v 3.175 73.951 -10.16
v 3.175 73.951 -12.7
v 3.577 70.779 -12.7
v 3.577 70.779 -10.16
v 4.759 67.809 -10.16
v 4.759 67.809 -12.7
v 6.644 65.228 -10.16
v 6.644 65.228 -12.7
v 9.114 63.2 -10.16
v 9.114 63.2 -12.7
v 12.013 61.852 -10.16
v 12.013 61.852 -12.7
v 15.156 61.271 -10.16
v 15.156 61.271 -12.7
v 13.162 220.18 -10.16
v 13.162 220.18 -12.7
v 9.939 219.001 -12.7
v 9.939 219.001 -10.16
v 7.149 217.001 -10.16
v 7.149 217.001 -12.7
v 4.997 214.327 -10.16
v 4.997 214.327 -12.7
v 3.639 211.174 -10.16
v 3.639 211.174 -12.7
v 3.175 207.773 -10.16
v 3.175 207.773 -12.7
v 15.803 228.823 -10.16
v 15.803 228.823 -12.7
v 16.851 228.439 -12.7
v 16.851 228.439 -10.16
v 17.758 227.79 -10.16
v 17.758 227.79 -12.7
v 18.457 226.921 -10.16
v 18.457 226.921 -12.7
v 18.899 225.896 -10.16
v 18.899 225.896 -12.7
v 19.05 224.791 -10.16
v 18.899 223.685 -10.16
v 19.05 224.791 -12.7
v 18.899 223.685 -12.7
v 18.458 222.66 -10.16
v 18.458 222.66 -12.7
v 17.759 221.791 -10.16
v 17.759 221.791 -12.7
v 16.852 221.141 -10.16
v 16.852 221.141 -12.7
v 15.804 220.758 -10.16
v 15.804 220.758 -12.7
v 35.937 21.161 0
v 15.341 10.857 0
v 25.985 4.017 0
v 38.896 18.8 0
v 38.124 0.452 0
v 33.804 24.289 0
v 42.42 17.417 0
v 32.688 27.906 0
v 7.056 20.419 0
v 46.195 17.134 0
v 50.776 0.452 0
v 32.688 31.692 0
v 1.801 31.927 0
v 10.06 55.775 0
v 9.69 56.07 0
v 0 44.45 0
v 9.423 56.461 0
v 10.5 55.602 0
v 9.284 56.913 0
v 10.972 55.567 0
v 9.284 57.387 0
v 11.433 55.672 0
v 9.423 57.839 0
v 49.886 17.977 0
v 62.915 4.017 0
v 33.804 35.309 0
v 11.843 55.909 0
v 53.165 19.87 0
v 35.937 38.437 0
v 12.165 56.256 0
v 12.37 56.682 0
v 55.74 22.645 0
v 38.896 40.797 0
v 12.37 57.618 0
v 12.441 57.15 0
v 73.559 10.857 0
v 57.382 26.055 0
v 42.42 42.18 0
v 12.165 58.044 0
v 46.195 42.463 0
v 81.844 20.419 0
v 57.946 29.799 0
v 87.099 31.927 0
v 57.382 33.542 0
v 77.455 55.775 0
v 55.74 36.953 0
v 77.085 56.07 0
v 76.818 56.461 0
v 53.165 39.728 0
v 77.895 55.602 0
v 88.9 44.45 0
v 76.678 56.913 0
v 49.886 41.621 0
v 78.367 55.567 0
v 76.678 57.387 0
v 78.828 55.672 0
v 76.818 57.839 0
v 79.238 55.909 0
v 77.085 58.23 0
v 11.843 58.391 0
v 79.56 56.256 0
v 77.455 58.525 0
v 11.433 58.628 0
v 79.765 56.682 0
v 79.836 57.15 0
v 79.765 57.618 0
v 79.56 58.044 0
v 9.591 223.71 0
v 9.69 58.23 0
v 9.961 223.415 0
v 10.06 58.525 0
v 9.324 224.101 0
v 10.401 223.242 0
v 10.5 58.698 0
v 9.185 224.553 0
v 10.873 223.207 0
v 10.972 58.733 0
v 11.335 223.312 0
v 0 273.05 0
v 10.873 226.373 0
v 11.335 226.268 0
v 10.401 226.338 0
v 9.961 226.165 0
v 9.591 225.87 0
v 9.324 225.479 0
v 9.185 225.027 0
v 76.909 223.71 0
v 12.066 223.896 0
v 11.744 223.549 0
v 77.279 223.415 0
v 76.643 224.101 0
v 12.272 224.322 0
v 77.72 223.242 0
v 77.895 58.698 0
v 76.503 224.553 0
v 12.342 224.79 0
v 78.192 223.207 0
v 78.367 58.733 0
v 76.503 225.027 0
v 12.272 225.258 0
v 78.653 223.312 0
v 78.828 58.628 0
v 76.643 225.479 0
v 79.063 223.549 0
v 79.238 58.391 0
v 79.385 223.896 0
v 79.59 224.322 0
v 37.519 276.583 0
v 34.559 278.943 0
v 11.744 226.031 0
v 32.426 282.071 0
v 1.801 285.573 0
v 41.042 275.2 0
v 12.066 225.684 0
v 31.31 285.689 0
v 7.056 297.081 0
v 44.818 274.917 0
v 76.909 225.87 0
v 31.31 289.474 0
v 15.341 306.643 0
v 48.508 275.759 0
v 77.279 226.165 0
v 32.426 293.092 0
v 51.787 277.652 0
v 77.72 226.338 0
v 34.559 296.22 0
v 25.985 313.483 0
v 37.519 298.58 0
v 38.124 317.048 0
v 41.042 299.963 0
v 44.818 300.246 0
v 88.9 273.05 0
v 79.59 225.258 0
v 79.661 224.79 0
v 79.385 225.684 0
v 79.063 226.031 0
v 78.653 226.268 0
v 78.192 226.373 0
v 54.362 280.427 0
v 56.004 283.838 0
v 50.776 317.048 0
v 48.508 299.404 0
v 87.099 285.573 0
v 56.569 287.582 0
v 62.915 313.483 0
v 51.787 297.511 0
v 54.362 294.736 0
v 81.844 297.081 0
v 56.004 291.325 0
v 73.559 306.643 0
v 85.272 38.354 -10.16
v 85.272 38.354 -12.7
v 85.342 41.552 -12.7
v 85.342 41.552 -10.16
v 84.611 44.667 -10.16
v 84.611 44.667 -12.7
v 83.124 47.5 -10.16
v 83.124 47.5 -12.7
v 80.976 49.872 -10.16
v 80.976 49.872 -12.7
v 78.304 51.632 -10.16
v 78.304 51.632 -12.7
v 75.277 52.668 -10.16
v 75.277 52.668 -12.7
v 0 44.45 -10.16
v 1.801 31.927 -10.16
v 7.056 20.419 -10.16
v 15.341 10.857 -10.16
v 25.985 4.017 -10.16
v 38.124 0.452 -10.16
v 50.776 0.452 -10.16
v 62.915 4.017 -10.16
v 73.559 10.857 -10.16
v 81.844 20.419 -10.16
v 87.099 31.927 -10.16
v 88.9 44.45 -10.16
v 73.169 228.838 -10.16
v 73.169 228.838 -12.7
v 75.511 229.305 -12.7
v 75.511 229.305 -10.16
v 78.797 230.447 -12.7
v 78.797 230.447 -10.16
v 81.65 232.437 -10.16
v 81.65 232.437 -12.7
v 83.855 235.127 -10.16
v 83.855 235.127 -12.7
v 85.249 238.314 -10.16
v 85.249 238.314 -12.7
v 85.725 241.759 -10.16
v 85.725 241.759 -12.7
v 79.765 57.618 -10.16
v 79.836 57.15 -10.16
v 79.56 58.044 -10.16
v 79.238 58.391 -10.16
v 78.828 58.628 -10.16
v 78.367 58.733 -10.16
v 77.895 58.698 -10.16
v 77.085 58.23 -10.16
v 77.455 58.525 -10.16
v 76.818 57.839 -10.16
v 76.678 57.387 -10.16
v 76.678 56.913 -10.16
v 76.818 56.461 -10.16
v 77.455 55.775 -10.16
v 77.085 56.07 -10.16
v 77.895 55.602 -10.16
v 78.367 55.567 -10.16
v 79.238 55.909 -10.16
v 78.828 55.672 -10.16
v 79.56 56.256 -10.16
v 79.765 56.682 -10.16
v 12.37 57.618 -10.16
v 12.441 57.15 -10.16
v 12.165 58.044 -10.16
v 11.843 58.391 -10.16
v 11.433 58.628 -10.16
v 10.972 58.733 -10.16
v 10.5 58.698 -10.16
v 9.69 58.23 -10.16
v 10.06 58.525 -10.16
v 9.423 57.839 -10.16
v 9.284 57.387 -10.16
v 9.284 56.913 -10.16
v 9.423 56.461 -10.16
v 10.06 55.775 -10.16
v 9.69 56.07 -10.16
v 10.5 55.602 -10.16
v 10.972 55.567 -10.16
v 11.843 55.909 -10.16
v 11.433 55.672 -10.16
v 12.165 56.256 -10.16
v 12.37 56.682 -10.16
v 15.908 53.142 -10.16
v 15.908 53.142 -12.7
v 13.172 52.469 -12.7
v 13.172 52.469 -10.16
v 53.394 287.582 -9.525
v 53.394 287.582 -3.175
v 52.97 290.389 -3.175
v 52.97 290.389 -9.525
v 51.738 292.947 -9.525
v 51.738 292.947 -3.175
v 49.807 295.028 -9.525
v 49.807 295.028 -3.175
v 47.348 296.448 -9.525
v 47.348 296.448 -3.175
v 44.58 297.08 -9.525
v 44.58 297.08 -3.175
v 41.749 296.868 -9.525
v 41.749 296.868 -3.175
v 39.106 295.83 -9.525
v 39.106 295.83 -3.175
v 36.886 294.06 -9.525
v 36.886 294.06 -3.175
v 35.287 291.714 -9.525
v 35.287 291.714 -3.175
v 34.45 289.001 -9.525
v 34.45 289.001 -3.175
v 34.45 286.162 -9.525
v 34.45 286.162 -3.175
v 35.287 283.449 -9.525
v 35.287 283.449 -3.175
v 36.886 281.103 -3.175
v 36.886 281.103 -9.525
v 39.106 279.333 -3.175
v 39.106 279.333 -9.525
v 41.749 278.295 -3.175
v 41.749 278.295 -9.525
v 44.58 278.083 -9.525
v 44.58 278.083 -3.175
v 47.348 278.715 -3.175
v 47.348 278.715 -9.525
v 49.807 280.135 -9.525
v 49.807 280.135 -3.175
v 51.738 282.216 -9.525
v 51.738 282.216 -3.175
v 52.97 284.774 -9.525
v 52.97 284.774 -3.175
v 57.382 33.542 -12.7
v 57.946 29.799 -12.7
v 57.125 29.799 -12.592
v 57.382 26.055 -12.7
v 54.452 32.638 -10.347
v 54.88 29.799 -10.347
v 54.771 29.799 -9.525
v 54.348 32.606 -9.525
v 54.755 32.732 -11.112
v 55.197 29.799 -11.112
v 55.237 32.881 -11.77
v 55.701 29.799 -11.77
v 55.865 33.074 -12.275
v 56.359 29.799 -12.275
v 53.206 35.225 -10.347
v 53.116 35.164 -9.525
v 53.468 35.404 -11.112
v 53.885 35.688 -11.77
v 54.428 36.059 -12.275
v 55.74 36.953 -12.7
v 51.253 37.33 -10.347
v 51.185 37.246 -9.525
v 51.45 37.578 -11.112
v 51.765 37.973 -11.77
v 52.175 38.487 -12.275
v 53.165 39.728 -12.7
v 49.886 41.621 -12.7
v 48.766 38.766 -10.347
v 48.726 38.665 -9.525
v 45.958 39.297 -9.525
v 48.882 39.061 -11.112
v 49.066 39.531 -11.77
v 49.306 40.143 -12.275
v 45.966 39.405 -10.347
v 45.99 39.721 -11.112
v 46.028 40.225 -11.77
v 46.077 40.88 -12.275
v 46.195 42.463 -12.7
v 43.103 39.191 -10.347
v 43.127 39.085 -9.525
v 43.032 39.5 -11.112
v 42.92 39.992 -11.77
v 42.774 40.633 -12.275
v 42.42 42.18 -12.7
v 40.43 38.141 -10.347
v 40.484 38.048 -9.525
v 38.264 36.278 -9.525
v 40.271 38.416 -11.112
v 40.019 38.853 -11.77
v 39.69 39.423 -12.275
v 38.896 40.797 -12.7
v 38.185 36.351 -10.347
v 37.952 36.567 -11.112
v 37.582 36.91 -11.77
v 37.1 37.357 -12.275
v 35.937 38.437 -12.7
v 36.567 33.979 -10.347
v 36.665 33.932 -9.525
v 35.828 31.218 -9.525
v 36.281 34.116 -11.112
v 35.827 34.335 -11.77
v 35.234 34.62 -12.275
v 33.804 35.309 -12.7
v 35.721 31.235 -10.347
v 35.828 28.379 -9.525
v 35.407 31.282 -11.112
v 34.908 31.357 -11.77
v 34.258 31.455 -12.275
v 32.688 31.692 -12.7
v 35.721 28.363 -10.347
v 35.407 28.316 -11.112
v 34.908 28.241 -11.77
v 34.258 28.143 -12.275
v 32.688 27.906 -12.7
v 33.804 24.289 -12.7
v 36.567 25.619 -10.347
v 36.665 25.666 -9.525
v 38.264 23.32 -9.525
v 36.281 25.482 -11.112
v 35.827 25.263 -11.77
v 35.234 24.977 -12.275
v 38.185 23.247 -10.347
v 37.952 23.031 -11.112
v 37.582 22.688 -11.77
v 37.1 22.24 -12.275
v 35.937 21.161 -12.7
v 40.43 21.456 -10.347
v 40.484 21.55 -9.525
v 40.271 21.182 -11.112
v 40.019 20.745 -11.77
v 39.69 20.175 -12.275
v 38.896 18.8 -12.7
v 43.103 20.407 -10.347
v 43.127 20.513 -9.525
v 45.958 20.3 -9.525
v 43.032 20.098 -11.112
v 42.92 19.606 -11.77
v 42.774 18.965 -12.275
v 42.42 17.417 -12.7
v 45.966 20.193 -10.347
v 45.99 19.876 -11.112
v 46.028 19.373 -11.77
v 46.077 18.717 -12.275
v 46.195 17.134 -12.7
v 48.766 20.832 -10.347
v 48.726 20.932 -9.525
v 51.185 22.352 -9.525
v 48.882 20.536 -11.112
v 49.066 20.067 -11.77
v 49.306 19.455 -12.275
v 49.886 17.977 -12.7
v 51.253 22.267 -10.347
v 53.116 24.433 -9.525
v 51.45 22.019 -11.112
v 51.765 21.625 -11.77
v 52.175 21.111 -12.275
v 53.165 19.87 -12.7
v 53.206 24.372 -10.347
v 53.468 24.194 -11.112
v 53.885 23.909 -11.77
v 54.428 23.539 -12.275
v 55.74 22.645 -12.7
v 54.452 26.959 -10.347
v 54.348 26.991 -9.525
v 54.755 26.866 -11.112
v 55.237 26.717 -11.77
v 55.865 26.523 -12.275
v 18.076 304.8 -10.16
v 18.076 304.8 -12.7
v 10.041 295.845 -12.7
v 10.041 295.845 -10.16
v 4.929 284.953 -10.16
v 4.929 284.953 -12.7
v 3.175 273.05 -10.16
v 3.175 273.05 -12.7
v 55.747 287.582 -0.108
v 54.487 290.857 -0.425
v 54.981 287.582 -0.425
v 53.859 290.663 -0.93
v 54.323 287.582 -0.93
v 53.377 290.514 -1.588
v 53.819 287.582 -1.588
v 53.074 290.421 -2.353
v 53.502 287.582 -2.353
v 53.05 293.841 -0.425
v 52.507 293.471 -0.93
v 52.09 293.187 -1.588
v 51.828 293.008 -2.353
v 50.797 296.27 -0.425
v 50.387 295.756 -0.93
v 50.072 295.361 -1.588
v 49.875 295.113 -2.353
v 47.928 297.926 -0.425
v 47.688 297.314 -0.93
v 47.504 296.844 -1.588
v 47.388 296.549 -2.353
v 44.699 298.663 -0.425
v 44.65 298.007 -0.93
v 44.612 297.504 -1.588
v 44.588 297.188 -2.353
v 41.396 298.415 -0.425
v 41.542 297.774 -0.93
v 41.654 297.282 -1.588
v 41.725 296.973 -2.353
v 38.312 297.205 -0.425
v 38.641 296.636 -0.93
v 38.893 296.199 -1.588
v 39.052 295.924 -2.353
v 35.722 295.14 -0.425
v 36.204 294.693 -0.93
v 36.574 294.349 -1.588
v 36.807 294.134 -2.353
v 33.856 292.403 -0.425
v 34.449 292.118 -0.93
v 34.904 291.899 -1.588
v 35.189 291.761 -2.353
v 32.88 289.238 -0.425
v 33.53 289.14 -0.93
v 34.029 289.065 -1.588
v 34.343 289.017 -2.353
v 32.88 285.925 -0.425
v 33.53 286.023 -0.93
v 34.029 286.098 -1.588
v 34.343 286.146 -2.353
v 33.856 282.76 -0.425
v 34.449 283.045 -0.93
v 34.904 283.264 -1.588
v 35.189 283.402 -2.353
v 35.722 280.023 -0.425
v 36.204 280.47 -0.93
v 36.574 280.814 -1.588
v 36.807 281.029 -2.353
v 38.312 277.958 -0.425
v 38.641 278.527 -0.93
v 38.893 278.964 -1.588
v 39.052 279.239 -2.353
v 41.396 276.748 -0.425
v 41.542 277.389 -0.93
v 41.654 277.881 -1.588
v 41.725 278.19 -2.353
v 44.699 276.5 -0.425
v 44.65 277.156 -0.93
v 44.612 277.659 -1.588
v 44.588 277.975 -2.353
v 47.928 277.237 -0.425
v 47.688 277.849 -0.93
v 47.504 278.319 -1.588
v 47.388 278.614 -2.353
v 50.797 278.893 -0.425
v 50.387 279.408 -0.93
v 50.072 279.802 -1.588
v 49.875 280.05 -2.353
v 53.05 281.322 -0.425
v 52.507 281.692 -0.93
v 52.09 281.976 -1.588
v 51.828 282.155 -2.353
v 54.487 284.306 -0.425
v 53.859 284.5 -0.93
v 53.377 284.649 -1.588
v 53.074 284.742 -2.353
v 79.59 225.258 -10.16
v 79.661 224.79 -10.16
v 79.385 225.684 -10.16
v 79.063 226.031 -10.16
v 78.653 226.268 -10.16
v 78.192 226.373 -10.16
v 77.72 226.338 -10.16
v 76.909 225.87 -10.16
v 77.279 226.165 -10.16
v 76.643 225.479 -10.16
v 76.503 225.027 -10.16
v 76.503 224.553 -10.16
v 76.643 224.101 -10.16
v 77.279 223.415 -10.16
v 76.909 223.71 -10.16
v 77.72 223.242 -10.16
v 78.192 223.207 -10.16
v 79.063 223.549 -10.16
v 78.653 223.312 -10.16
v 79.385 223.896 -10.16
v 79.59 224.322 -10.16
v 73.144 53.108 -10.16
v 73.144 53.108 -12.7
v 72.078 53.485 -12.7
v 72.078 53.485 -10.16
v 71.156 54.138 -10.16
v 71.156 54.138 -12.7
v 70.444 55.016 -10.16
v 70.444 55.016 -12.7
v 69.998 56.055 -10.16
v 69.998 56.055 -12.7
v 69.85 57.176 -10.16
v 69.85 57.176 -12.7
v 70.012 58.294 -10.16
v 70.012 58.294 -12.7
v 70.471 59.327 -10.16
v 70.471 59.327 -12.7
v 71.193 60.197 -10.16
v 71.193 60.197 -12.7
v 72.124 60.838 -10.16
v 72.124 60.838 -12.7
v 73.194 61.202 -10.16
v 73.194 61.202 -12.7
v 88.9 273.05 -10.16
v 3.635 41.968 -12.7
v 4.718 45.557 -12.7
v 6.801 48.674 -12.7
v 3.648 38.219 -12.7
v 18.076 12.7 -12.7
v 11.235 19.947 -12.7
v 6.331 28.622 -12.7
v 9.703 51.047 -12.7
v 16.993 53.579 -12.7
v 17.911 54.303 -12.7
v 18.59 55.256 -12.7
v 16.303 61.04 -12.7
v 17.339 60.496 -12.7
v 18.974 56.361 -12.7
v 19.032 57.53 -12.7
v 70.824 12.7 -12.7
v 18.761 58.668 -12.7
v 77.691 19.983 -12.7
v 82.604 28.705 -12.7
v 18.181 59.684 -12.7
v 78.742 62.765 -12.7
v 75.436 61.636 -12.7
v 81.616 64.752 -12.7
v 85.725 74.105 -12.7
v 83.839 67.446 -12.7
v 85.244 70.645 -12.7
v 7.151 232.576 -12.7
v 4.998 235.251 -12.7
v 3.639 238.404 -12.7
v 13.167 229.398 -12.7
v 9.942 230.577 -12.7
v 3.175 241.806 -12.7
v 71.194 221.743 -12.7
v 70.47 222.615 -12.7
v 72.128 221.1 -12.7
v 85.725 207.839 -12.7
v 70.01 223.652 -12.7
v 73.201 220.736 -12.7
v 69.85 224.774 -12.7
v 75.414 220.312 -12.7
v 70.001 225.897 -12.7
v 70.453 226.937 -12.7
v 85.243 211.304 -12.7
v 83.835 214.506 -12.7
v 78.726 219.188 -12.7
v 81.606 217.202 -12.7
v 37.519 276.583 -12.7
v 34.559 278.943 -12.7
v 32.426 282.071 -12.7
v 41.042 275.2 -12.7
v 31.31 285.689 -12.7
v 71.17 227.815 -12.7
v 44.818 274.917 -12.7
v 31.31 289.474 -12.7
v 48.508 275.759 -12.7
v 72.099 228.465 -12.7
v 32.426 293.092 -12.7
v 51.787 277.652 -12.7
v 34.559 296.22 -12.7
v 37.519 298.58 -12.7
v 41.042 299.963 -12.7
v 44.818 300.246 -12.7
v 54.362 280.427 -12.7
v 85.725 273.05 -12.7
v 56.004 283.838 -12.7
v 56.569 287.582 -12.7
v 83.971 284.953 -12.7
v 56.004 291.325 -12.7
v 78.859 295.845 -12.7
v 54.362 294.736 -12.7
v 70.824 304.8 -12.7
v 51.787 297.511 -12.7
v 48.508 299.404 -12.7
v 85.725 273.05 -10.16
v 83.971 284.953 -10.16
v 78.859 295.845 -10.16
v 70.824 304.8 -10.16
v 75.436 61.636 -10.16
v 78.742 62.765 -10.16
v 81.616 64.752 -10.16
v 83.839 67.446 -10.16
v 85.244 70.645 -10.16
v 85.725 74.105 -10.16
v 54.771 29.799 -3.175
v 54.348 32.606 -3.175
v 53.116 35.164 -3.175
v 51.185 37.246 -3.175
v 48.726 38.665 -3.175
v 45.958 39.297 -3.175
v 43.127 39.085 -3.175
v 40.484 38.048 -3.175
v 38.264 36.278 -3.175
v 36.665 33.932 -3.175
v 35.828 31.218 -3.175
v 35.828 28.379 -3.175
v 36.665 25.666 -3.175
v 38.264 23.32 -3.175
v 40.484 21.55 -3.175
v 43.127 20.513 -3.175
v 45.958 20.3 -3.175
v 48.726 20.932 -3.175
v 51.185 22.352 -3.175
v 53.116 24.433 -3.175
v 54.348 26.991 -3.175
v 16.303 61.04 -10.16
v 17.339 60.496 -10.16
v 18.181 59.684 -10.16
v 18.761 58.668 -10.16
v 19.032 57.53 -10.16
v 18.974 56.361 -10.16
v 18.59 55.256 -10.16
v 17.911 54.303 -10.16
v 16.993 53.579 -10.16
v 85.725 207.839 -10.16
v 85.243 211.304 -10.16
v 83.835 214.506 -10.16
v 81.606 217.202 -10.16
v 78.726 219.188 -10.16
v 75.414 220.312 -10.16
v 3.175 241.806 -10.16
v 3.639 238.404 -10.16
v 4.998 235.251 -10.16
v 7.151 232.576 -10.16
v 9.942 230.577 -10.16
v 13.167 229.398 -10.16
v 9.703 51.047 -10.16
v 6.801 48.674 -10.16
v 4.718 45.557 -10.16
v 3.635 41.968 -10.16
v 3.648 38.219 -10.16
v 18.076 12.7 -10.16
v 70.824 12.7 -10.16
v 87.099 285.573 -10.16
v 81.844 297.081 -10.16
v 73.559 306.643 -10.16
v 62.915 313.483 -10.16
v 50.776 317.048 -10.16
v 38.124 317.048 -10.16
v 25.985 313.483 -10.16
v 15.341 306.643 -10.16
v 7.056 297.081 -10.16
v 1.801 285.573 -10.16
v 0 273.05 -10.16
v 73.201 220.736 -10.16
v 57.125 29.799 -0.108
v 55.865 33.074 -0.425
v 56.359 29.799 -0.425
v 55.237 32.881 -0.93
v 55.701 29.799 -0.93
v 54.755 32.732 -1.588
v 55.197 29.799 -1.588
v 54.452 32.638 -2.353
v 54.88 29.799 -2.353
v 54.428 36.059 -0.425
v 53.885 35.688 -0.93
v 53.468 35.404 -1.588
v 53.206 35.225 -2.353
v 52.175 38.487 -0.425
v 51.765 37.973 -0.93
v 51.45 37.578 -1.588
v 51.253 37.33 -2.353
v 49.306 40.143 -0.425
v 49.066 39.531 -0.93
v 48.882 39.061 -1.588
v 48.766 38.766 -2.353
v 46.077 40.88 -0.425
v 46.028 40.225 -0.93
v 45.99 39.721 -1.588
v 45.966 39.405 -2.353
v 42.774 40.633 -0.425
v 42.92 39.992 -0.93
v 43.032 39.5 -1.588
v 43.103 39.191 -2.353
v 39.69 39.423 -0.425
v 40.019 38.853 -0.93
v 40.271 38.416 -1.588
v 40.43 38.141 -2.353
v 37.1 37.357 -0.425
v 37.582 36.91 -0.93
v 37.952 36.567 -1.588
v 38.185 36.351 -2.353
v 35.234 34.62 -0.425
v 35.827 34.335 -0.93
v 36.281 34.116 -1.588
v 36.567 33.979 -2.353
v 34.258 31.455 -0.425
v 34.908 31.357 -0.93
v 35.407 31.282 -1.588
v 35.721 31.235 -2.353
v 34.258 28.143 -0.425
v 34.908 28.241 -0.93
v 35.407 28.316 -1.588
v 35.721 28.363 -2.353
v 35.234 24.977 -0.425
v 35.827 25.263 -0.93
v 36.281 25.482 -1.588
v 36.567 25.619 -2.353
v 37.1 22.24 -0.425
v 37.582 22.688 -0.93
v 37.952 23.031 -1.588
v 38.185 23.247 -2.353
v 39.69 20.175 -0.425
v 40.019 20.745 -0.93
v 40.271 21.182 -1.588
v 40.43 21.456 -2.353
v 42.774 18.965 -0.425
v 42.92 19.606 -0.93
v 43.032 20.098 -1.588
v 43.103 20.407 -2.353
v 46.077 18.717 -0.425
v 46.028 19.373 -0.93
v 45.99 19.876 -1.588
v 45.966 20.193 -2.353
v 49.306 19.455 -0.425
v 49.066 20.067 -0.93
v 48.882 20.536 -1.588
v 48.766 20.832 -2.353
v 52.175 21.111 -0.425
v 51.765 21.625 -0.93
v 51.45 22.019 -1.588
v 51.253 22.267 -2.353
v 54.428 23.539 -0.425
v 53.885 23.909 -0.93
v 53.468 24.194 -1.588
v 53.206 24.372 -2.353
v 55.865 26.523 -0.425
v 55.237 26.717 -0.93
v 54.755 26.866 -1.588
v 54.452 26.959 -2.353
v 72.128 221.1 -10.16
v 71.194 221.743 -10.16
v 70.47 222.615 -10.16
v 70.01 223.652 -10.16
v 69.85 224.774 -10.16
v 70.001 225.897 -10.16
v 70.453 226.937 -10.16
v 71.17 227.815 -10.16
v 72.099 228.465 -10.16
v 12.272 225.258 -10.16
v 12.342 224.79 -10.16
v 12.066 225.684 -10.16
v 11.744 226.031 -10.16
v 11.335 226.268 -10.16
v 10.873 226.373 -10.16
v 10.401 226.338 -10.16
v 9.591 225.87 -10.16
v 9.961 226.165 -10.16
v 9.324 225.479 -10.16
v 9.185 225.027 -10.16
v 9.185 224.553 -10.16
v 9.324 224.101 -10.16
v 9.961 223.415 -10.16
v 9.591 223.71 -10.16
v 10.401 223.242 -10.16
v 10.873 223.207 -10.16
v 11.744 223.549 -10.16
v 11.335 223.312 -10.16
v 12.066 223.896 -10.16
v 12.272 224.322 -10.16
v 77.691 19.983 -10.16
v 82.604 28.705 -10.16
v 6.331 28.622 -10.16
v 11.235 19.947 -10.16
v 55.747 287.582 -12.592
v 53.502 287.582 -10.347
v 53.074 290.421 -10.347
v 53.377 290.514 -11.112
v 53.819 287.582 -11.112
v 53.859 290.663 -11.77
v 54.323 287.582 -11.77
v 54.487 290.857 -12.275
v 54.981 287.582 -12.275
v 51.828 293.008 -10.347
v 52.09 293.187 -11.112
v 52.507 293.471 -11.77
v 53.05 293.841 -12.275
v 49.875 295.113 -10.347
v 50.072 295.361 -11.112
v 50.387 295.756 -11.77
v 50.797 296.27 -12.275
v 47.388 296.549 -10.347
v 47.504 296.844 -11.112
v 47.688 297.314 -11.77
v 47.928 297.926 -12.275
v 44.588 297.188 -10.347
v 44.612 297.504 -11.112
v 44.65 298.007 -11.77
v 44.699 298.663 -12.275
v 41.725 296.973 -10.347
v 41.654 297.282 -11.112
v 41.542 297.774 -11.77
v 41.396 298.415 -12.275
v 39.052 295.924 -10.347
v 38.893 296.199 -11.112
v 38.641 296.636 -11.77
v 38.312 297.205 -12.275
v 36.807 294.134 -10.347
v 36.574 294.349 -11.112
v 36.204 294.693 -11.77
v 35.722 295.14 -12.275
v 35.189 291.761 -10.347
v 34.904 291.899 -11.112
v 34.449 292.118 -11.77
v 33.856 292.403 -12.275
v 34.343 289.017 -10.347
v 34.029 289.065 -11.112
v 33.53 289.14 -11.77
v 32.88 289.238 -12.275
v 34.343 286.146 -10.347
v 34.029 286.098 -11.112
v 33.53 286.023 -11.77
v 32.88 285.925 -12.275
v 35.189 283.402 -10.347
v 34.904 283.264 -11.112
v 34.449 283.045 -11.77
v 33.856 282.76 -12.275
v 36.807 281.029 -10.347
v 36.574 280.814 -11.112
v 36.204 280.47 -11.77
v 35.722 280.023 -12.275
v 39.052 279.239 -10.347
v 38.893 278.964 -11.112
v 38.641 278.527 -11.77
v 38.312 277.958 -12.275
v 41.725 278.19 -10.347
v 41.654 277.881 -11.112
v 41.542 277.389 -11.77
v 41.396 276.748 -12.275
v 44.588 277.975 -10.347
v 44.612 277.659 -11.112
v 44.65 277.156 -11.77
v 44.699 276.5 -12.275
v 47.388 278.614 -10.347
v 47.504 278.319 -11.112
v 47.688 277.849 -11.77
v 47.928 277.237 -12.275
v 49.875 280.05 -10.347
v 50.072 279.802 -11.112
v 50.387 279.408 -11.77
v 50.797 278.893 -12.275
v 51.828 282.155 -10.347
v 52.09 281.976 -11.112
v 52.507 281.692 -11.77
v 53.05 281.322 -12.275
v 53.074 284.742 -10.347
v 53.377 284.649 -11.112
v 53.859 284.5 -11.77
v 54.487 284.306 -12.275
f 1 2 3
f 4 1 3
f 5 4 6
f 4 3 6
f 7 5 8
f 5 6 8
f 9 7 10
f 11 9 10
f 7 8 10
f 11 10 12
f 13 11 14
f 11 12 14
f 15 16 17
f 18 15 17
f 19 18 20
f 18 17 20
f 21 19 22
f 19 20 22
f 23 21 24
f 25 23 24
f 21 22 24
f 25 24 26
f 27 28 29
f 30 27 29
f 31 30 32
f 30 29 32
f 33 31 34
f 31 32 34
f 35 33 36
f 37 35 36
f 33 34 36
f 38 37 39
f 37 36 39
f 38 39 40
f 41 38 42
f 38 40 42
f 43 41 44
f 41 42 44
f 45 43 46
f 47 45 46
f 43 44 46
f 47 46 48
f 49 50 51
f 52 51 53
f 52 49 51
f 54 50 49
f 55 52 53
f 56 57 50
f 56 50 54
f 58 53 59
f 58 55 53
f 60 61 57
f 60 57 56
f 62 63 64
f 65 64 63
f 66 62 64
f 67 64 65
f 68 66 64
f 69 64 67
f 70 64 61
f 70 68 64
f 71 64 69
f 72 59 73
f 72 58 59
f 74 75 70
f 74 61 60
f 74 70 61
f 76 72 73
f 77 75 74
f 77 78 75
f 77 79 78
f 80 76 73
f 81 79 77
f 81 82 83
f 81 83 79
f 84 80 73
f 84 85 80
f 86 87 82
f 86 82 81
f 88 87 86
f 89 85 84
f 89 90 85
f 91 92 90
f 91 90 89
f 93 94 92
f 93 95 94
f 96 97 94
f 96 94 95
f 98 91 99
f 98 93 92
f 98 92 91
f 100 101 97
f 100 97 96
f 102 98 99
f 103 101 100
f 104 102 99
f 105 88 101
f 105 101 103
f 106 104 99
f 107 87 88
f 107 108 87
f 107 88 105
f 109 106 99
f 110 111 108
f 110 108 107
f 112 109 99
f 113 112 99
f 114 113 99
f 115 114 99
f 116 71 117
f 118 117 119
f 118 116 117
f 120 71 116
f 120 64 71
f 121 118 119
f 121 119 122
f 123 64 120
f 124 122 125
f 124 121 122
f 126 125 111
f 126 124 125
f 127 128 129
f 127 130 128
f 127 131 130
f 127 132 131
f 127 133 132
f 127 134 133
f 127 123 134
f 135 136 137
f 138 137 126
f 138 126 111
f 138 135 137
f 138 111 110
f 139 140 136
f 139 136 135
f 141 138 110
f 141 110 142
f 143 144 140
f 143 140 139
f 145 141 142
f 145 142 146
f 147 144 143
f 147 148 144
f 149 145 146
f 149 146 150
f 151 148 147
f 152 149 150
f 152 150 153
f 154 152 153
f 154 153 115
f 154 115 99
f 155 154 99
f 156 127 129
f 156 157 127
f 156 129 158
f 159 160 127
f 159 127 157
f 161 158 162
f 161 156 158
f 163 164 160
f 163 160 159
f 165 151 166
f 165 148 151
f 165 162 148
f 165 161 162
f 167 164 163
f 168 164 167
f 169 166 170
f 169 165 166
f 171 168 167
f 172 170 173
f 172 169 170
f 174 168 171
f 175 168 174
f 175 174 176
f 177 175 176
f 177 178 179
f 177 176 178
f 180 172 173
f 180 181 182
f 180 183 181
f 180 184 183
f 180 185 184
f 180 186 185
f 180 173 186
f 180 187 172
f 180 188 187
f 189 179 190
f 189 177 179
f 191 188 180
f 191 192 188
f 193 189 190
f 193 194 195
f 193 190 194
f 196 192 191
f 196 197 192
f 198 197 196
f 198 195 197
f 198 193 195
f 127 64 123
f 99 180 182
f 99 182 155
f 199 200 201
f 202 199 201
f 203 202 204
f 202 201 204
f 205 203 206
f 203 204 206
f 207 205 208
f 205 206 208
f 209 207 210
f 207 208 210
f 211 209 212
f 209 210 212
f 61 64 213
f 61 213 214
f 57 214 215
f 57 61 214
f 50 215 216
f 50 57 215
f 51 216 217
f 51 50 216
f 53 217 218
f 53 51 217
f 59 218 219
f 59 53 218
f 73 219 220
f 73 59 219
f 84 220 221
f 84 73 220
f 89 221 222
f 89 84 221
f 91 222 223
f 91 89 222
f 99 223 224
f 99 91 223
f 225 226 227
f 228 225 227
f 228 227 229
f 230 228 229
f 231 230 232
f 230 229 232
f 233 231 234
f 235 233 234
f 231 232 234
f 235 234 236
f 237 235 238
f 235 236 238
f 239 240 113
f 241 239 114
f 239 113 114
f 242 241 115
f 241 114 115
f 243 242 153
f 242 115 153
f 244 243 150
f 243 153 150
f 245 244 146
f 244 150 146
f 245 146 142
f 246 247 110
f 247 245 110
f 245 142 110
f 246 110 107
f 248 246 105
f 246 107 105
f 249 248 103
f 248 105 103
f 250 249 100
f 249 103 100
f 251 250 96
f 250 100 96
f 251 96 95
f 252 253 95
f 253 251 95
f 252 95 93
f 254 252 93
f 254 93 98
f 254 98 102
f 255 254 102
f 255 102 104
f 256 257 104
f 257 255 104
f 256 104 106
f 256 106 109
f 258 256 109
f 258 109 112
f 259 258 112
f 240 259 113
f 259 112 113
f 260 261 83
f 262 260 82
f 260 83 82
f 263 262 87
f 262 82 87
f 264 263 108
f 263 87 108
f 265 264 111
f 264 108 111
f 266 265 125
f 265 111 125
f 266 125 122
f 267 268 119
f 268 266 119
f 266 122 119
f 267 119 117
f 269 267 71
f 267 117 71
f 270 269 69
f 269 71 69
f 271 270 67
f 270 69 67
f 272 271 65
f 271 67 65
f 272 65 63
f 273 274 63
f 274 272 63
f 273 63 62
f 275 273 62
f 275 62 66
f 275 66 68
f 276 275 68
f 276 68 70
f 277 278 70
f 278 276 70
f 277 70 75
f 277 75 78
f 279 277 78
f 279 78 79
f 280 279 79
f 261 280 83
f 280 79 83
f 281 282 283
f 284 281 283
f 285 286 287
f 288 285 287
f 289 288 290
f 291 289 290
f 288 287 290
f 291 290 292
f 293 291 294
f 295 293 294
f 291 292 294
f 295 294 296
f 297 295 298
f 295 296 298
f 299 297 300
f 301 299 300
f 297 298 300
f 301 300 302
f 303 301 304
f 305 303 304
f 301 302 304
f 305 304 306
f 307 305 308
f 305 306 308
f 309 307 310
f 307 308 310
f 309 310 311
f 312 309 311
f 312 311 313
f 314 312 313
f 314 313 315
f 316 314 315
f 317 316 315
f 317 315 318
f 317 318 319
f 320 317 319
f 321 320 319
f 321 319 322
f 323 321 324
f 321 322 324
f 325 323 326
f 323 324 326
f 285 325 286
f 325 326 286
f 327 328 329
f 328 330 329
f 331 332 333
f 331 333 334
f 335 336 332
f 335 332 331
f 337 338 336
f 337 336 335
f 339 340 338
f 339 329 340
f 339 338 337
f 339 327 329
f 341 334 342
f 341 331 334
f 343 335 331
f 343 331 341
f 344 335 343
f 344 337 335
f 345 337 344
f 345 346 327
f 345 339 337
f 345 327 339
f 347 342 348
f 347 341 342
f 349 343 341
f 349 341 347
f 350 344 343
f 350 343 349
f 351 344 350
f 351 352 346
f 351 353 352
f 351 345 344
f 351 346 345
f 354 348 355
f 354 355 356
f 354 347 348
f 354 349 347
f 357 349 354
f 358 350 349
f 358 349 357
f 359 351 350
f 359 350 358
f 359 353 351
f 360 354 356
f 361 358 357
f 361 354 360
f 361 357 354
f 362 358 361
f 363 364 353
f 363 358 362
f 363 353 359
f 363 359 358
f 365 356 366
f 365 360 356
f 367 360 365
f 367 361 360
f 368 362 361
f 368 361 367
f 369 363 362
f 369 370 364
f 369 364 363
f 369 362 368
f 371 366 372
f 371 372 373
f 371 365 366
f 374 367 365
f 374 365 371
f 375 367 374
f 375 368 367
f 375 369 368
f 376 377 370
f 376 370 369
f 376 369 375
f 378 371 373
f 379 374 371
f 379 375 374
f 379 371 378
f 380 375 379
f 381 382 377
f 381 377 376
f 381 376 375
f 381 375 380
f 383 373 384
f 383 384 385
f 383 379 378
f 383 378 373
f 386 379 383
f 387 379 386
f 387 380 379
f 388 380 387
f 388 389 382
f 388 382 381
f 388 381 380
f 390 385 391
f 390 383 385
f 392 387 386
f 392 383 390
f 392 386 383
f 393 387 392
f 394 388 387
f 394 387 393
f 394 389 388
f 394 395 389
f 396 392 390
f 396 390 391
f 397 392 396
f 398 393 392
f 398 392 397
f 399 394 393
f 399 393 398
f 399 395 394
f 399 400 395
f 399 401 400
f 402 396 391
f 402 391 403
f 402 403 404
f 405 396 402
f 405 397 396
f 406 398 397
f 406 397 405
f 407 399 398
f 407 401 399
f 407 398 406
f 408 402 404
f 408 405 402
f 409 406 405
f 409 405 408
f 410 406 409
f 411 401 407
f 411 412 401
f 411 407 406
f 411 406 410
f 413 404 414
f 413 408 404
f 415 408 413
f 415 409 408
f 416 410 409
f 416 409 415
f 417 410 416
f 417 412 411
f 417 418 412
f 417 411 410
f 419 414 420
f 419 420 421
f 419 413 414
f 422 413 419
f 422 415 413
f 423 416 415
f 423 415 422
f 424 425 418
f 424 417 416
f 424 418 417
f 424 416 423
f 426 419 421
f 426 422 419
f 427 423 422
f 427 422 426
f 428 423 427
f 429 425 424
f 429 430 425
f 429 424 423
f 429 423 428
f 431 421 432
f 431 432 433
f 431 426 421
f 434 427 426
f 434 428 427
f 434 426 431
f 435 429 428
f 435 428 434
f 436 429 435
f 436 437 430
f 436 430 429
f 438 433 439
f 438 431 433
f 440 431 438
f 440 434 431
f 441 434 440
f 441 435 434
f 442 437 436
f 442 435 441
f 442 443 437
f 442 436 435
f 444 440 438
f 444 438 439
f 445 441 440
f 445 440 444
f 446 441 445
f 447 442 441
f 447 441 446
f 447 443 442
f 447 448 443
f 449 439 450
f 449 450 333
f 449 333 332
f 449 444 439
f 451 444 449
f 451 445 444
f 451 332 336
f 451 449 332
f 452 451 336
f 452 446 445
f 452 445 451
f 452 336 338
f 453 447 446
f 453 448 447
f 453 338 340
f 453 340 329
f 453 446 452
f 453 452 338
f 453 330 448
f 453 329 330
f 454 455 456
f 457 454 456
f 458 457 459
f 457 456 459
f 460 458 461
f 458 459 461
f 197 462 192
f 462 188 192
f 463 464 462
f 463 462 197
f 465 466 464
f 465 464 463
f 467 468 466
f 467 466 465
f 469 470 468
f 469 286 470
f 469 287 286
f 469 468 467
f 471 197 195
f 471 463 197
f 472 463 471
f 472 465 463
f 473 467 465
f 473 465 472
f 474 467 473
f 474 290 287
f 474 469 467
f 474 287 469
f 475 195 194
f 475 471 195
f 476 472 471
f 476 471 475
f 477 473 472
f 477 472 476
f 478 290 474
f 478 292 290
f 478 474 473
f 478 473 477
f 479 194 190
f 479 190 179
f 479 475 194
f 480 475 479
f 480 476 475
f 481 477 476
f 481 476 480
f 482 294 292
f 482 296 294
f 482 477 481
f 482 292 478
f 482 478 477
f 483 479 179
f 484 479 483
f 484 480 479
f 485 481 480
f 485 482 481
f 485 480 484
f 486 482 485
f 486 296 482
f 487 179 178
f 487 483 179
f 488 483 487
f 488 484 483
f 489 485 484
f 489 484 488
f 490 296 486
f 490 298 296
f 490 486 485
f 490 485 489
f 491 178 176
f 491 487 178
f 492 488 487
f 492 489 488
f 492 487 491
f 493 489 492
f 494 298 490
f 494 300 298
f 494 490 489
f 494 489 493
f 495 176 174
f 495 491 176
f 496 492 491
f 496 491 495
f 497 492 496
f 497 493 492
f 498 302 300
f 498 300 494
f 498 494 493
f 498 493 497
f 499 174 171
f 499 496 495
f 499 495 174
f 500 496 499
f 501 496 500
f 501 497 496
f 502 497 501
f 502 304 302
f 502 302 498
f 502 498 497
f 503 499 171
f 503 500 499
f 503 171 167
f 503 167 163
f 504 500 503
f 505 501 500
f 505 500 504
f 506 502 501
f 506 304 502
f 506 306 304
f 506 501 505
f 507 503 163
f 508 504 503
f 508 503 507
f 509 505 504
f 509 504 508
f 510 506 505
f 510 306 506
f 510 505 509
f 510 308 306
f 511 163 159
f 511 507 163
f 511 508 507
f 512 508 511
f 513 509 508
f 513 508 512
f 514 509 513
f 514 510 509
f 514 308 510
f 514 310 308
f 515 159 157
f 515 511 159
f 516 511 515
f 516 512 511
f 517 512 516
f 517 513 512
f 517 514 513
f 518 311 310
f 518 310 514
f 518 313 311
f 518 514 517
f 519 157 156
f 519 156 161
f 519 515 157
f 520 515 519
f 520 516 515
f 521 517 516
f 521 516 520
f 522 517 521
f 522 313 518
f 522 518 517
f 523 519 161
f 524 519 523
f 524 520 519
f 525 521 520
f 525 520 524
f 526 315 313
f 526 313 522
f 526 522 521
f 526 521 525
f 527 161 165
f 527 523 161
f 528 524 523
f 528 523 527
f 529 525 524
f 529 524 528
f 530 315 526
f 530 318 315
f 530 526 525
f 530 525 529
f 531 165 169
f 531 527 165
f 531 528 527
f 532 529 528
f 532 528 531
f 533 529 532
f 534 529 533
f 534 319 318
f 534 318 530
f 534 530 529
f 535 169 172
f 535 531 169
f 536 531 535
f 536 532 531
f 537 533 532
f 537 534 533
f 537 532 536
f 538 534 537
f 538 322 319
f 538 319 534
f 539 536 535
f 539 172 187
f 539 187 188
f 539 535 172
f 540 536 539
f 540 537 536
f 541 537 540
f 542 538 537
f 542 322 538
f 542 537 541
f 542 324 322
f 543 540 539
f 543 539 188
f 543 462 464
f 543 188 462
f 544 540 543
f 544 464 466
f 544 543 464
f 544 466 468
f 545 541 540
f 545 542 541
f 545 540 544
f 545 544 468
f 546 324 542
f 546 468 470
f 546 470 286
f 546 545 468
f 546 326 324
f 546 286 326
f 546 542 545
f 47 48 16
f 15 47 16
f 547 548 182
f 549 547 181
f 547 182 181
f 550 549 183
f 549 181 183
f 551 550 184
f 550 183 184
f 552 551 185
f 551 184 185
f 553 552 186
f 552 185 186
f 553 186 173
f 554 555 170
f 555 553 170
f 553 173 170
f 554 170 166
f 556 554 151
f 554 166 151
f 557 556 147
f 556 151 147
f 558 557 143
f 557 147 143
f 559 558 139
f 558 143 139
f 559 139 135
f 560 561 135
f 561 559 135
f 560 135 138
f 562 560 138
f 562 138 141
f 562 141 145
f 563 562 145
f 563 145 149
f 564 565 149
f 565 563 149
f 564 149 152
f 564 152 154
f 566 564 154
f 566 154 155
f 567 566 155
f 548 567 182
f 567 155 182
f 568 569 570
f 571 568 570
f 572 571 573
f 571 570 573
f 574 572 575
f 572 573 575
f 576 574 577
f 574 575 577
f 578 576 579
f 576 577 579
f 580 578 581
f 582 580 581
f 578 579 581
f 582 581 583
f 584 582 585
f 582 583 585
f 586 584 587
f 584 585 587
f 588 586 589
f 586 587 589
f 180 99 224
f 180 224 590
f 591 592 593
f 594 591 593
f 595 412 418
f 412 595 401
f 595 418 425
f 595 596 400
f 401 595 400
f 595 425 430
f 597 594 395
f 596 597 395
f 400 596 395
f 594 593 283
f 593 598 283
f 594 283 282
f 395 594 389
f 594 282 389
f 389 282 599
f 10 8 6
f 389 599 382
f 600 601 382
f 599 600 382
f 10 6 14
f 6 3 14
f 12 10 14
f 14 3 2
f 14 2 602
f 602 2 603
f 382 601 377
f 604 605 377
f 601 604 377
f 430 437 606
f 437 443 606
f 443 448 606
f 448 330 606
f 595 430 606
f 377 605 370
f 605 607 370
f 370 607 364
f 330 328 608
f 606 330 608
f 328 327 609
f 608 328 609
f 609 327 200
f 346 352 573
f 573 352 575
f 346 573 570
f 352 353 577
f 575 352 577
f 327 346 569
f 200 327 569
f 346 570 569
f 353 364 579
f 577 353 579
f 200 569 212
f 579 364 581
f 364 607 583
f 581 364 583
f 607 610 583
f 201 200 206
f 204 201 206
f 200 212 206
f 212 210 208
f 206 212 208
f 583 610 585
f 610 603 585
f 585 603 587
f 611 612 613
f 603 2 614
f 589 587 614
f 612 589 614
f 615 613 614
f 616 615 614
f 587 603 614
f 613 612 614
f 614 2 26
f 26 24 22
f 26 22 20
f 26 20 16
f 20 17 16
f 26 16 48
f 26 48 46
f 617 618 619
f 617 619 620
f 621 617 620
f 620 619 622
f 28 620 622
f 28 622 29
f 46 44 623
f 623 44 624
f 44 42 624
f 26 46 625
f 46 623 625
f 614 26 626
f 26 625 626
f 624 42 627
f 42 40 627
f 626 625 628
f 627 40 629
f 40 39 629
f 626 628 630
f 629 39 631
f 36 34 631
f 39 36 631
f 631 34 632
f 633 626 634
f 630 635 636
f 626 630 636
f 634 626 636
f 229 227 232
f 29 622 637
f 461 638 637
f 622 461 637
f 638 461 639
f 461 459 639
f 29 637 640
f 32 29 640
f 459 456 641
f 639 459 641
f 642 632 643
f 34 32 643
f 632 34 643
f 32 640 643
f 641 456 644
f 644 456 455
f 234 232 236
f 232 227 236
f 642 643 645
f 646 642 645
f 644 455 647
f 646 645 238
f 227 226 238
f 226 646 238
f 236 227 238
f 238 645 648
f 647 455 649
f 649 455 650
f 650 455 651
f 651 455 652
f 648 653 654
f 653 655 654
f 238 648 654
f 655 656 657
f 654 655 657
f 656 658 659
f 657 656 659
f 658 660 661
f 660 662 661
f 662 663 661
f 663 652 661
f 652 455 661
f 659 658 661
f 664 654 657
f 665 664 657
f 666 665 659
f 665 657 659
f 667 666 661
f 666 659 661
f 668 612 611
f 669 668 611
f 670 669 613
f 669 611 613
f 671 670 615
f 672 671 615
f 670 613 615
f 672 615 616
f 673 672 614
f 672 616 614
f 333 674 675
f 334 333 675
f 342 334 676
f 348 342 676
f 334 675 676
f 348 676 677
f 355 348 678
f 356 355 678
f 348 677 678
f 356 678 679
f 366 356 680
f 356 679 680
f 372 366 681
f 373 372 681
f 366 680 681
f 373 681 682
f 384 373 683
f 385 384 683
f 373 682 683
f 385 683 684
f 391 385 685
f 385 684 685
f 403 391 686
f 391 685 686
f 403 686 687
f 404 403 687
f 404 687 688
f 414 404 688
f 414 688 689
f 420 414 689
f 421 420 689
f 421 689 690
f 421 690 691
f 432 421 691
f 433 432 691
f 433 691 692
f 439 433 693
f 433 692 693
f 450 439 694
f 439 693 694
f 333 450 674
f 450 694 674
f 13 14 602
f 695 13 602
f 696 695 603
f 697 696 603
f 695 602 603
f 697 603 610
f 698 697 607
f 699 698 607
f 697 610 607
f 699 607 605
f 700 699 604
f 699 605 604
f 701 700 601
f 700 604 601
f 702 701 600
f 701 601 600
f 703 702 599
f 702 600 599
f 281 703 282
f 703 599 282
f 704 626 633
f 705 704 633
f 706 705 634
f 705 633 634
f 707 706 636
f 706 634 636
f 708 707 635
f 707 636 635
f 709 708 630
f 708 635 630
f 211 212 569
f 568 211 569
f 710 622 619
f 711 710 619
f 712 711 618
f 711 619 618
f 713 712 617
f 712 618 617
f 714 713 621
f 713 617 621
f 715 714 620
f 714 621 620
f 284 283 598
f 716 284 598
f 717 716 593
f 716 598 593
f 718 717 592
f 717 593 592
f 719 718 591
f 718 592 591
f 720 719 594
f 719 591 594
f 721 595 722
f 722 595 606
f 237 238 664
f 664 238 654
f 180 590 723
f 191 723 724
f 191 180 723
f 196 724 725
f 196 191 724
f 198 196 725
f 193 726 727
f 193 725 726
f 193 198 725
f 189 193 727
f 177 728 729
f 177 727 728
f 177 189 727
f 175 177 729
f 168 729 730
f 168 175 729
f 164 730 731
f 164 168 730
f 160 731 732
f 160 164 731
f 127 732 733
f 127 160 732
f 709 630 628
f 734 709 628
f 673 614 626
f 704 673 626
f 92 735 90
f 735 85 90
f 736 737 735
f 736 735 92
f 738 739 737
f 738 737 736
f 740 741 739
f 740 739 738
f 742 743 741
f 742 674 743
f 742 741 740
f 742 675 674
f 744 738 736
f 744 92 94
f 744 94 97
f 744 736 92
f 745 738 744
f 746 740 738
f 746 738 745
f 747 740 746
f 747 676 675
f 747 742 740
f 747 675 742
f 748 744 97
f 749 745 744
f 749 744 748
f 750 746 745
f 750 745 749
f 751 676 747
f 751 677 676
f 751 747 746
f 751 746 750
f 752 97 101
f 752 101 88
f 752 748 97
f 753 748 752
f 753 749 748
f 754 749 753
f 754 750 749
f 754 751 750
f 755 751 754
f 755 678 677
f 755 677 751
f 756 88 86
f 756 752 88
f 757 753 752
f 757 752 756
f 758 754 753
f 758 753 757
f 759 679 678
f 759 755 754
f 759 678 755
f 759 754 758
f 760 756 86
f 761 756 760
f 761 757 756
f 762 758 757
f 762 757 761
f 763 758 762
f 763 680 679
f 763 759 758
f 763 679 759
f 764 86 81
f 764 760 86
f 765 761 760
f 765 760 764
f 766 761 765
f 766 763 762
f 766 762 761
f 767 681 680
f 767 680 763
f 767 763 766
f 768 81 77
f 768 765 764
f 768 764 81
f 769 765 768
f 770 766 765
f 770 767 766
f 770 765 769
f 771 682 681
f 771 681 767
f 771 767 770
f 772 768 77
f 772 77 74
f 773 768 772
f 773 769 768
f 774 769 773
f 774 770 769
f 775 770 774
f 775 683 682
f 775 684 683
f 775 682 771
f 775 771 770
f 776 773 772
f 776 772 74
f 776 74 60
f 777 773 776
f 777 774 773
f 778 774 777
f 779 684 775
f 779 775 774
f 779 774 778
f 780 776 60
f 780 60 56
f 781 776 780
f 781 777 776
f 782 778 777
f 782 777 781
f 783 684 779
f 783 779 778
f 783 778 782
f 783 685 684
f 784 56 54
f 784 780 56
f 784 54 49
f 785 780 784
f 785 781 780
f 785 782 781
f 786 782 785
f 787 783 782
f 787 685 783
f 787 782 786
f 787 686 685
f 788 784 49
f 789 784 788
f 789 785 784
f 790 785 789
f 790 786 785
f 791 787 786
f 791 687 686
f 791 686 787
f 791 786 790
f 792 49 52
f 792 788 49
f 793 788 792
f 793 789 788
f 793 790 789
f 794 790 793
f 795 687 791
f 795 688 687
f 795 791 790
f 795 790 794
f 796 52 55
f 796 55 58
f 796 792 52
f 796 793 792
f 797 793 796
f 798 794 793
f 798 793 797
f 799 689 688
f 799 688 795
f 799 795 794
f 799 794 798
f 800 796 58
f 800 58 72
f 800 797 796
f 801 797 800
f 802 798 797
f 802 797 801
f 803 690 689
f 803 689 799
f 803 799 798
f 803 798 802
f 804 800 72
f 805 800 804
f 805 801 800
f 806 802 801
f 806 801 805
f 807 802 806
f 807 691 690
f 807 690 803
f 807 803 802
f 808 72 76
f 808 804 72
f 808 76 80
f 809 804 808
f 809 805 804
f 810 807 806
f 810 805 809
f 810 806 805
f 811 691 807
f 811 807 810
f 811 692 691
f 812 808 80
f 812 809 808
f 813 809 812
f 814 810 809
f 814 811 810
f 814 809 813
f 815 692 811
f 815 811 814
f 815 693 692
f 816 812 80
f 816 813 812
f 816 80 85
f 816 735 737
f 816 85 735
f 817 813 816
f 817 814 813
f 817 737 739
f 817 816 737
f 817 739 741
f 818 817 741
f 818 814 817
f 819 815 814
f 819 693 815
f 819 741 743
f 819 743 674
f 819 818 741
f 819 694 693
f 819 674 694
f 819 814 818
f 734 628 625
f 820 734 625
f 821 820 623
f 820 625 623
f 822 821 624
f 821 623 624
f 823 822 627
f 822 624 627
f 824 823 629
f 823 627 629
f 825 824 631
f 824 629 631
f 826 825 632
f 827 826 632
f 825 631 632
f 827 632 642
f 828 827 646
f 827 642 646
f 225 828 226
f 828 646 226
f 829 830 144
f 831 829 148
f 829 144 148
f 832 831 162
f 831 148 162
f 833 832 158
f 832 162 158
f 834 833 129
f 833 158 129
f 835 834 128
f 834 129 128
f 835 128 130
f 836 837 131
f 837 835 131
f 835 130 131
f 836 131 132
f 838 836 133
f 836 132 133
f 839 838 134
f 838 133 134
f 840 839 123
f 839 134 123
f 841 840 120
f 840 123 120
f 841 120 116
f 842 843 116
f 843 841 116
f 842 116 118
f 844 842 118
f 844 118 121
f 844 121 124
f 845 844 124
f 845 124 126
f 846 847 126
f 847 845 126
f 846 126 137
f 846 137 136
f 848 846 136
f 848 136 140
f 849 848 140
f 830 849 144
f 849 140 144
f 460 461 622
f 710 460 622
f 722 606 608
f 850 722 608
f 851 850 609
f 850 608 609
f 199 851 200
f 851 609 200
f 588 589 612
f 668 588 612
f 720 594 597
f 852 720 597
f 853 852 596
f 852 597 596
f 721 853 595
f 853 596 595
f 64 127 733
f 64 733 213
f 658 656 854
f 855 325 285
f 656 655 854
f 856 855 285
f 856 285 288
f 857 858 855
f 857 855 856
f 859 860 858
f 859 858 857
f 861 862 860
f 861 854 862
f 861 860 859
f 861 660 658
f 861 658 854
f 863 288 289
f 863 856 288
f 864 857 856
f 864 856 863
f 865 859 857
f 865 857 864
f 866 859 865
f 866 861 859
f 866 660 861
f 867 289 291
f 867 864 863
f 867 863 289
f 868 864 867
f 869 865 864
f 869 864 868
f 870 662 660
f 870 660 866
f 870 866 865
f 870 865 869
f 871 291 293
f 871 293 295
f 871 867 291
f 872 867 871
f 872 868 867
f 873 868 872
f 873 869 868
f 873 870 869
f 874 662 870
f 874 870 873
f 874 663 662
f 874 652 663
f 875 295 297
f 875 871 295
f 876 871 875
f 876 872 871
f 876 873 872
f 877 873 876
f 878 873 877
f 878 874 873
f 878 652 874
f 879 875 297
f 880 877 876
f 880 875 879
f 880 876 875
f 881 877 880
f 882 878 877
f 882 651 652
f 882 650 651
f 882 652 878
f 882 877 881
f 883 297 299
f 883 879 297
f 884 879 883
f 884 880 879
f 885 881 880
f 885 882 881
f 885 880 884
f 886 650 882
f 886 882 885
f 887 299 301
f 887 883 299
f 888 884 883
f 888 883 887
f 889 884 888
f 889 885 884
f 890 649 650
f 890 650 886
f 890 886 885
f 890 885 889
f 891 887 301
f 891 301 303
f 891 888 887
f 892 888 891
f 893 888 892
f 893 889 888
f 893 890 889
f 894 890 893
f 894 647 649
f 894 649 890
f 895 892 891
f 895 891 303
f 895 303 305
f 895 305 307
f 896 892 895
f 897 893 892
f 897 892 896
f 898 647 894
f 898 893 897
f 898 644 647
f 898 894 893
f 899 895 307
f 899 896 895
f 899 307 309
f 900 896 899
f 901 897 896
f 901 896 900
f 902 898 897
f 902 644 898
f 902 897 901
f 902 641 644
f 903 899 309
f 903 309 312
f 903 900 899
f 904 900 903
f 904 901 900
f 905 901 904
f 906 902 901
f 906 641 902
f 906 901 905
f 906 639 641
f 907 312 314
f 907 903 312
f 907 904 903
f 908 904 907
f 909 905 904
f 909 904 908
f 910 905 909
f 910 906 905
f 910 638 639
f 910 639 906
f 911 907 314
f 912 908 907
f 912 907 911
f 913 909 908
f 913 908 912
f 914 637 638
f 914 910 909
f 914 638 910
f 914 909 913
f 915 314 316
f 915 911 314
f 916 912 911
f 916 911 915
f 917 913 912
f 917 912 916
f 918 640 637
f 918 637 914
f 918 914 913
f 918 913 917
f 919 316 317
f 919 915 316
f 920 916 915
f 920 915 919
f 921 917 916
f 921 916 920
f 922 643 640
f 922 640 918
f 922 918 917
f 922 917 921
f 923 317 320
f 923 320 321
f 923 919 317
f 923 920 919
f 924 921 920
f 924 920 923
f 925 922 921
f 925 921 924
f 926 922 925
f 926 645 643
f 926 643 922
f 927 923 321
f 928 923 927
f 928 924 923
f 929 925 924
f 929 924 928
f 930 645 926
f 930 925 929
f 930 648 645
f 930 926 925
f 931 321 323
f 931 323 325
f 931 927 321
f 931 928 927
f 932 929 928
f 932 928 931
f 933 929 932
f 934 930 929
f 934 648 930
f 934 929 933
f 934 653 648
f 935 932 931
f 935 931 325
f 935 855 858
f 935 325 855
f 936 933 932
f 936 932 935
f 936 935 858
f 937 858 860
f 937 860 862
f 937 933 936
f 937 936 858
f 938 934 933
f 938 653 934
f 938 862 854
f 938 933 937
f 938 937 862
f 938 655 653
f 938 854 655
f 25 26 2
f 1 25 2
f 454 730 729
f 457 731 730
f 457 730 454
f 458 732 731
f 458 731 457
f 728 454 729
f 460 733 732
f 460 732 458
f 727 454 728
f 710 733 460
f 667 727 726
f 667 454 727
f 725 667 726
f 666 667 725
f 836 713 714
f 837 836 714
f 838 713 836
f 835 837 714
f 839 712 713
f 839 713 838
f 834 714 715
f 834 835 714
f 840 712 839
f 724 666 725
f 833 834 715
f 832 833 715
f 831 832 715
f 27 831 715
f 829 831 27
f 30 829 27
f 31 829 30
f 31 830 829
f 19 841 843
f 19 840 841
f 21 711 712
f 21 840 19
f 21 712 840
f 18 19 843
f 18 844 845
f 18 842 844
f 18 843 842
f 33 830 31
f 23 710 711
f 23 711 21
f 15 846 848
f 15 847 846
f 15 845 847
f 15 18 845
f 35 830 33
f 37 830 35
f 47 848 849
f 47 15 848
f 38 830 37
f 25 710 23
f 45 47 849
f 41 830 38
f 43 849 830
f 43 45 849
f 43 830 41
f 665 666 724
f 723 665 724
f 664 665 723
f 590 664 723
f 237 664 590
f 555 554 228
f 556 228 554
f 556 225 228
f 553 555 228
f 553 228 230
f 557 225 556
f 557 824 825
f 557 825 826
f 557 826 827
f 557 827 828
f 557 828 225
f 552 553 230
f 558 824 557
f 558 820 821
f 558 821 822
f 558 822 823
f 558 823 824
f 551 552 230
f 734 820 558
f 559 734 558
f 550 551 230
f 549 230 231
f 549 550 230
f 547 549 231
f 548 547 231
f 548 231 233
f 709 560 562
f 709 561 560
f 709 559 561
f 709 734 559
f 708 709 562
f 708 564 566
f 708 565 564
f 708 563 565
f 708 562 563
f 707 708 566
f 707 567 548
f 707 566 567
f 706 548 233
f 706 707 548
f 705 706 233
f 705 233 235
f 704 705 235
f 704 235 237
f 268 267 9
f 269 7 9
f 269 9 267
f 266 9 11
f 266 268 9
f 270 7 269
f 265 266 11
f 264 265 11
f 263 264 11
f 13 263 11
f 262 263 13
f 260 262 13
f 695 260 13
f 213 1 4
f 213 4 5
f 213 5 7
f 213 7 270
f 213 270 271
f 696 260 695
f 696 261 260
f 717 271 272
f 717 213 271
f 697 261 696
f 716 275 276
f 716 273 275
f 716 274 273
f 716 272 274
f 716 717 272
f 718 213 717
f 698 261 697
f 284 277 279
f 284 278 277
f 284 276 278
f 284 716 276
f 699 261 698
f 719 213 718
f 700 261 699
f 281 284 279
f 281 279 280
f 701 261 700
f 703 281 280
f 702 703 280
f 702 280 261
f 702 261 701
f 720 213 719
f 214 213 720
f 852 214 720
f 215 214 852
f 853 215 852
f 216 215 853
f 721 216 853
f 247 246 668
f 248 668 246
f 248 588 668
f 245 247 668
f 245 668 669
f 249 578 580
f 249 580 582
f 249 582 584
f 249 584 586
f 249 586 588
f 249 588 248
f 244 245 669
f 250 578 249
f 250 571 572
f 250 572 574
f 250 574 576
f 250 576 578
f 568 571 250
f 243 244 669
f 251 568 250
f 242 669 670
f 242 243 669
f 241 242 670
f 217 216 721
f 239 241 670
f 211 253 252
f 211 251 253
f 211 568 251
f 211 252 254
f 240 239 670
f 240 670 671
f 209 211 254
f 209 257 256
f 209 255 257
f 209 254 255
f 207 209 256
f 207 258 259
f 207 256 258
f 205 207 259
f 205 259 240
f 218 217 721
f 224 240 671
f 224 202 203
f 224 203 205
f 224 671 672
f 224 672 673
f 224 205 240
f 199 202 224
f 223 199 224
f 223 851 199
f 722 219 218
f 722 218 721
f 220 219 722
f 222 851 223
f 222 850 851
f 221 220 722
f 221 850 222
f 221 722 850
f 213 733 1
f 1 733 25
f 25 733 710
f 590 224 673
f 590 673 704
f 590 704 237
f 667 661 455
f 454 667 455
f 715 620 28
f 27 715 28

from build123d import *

# Parameters (mm, degrees)
F1_R     = 1.5875
F1_R_2   = 9.525
F2_DEPTH = 12.7
F3_R     = 1.5875
F4_DEPTH = 2.54
F5_R     = 3.175


with BuildPart() as f2:
    # F1 (on Top) → F2 (new body)
    with BuildSketch(Plane.XY):
        with BuildLine():
            ThreePointArc((88.9, 273.05), (44.45, 317.5), (0, 273.05))
            Line((0, 273.05), (0, 44.45))
            ThreePointArc((0, 44.45), (44.45, 0), (88.9, 44.45))
            Line((88.9, 44.45), (88.9, 273.05))
        make_face()
        with Locations((10.853484273, 57.15)):
            Circle(F1_R, mode=Mode.SUBTRACT)
        with Locations((45.2464185655, 29.7988653183)):
            Circle(F1_R_2, mode=Mode.SUBTRACT)
        with Locations((78.2482549548, 57.15)):
            Circle(F1_R, mode=Mode.SUBTRACT)
        with Locations((10.7546523213, 224.79)):
            Circle(F1_R, mode=Mode.SUBTRACT)
        with Locations((43.8685081899, 287.5815033913)):
            Circle(F1_R_2, mode=Mode.SUBTRACT)
        with Locations((78.0730992556, 224.79)):
            Circle(F1_R, mode=Mode.SUBTRACT)
    extrude(amount=-F2_DEPTH)

    # F3 (on face) → F4 (cut)
    with BuildSketch(Plane(origin=(0, 0, -12.7), x_dir=(1, 0, 0), z_dir=(0, 0, -1))):
        with BuildLine():
            Line((0, -44.45), (0, -273.05))
            ThreePointArc((0, -273.05), (44.45, -317.5), (88.9, -273.05))
            Line((88.9, -273.05), (88.9, -44.45))
            ThreePointArc((88.9, -44.45), (44.45, 0), (0, -44.45))
        make_face()
        with Locations((10.7546523213, -224.79)):
            Circle(F3_R, mode=Mode.SUBTRACT)
        with Locations((78.0730992556, -224.79)):
            Circle(F3_R, mode=Mode.SUBTRACT)
        with BuildLine():
            Line((85.725, -241.7593711691), (85.725, -273.05))
            ThreePointArc((85.725, -273.05), (81.8143754619, -290.586506817), (70.8235307648, -304.8))
            Line((70.8235307648, -304.8), (18.0764692352, -304.8))
            ThreePointArc((18.0764692352, -304.8), (7.0856245381, -290.586506817), (3.175, -273.05))
            Line((3.175, -273.05), (3.175, -241.8057641091))
            ThreePointArc((3.175, -241.8057641091), (5.9834868143, -233.8403409002), (13.1668058106, -229.3978761248))
            Line((13.1668058106, -229.3978761248), (15.8026631116, -228.8225635949))
            ThreePointArc((15.8026631116, -228.8225635949), (19.0499999332, -224.7907424019), (15.8041137065, -220.757753291))
            Line((15.8041137065, -220.757753291), (13.1623424416, -220.1801542687))
            ThreePointArc((13.1623424416, -220.1801542687), (5.9820542559, -215.7368852391), (3.175, -207.7732413178))
            Line((3.175, -207.7732413178), (3.175, -73.9505208253))
            ThreePointArc((3.175, -73.9505208253), (6.6440839392, -65.2281250145), (15.1561320755, -61.2708824666))
            ThreePointArc((15.1561320755, -61.2708824666), (19.0324801493, -57.5298939621), (15.9075236341, -53.1417604001))
            Line((15.9075236341, -53.1417604001), (13.1716234423, -52.4694137795))
            ThreePointArc((13.1716234423, -52.4694137795), (5.6434616569, -47.1930989845), (3.648005568, -38.2191994597))
            ThreePointArc((3.648005568, -38.2191994597), (8.5202744008, -24.1354622654), (18.0764692352, -12.7))
            Line((18.0764692352, -12.7), (70.8235307648, -12.7))
            ThreePointArc((70.8235307648, -12.7), (80.4131304814, -24.1946582113), (85.2722946349, -38.3536169954))
            ThreePointArc((85.2722946349, -38.3536169954), (83.1241630177, -47.5004857983), (75.2768639326, -52.6676489864))
            Line((75.2768639326, -52.6676489864), (73.1437855148, -53.1075779034))
            ThreePointArc((73.1437855148, -53.1075779034), (69.850079032, -57.1755421779), (73.1938797929, -61.2024308286))
            Line((73.1938797929, -61.2024308286), (75.4361390988, -61.6360174279))
            ThreePointArc((75.4361390988, -61.6360174279), (82.8206997339, -66.0220738553), (85.725, -74.1050353622))
            Line((85.725, -74.1050353622), (85.725, -207.8391418625))
            ThreePointArc((85.725, -207.8391418625), (82.8133867938, -215.9309577263), (75.4135852009, -220.3124999003))
            Line((75.4135852009, -220.3124999003), (73.2012098097, -220.7361586377))
            ThreePointArc((73.2012098097, -220.7361586377), (69.8500316367, -224.7738395666), (73.1694897792, -228.8376382908))
            Line((73.1694897792, -228.8376382908), (75.5111852948, -229.3050995051))
            ThreePointArc((75.5111852948, -229.3050995051), (82.844993718, -233.7059418761), (85.725, -241.7593711691))
        make_face(mode=Mode.SUBTRACT)
        with Locations((10.853484273, -57.15)):
            Circle(F3_R, mode=Mode.SUBTRACT)
        with Locations((78.2482549548, -57.15)):
            Circle(F3_R, mode=Mode.SUBTRACT)
    extrude(amount=-F4_DEPTH, mode=Mode.SUBTRACT)

    # F5
    f5_edges = [f2.edges().sort_by_distance(p)[0] for p in [
        (35.721419, 29.798865, 0),
        (35.721419, 29.798865, -12.7),
        (34.343508, 287.581503, 0),
        (34.343508, 287.581503, -12.7),
    ]]
    fillet(f5_edges, radius=F5_R)


solid = f2.part
